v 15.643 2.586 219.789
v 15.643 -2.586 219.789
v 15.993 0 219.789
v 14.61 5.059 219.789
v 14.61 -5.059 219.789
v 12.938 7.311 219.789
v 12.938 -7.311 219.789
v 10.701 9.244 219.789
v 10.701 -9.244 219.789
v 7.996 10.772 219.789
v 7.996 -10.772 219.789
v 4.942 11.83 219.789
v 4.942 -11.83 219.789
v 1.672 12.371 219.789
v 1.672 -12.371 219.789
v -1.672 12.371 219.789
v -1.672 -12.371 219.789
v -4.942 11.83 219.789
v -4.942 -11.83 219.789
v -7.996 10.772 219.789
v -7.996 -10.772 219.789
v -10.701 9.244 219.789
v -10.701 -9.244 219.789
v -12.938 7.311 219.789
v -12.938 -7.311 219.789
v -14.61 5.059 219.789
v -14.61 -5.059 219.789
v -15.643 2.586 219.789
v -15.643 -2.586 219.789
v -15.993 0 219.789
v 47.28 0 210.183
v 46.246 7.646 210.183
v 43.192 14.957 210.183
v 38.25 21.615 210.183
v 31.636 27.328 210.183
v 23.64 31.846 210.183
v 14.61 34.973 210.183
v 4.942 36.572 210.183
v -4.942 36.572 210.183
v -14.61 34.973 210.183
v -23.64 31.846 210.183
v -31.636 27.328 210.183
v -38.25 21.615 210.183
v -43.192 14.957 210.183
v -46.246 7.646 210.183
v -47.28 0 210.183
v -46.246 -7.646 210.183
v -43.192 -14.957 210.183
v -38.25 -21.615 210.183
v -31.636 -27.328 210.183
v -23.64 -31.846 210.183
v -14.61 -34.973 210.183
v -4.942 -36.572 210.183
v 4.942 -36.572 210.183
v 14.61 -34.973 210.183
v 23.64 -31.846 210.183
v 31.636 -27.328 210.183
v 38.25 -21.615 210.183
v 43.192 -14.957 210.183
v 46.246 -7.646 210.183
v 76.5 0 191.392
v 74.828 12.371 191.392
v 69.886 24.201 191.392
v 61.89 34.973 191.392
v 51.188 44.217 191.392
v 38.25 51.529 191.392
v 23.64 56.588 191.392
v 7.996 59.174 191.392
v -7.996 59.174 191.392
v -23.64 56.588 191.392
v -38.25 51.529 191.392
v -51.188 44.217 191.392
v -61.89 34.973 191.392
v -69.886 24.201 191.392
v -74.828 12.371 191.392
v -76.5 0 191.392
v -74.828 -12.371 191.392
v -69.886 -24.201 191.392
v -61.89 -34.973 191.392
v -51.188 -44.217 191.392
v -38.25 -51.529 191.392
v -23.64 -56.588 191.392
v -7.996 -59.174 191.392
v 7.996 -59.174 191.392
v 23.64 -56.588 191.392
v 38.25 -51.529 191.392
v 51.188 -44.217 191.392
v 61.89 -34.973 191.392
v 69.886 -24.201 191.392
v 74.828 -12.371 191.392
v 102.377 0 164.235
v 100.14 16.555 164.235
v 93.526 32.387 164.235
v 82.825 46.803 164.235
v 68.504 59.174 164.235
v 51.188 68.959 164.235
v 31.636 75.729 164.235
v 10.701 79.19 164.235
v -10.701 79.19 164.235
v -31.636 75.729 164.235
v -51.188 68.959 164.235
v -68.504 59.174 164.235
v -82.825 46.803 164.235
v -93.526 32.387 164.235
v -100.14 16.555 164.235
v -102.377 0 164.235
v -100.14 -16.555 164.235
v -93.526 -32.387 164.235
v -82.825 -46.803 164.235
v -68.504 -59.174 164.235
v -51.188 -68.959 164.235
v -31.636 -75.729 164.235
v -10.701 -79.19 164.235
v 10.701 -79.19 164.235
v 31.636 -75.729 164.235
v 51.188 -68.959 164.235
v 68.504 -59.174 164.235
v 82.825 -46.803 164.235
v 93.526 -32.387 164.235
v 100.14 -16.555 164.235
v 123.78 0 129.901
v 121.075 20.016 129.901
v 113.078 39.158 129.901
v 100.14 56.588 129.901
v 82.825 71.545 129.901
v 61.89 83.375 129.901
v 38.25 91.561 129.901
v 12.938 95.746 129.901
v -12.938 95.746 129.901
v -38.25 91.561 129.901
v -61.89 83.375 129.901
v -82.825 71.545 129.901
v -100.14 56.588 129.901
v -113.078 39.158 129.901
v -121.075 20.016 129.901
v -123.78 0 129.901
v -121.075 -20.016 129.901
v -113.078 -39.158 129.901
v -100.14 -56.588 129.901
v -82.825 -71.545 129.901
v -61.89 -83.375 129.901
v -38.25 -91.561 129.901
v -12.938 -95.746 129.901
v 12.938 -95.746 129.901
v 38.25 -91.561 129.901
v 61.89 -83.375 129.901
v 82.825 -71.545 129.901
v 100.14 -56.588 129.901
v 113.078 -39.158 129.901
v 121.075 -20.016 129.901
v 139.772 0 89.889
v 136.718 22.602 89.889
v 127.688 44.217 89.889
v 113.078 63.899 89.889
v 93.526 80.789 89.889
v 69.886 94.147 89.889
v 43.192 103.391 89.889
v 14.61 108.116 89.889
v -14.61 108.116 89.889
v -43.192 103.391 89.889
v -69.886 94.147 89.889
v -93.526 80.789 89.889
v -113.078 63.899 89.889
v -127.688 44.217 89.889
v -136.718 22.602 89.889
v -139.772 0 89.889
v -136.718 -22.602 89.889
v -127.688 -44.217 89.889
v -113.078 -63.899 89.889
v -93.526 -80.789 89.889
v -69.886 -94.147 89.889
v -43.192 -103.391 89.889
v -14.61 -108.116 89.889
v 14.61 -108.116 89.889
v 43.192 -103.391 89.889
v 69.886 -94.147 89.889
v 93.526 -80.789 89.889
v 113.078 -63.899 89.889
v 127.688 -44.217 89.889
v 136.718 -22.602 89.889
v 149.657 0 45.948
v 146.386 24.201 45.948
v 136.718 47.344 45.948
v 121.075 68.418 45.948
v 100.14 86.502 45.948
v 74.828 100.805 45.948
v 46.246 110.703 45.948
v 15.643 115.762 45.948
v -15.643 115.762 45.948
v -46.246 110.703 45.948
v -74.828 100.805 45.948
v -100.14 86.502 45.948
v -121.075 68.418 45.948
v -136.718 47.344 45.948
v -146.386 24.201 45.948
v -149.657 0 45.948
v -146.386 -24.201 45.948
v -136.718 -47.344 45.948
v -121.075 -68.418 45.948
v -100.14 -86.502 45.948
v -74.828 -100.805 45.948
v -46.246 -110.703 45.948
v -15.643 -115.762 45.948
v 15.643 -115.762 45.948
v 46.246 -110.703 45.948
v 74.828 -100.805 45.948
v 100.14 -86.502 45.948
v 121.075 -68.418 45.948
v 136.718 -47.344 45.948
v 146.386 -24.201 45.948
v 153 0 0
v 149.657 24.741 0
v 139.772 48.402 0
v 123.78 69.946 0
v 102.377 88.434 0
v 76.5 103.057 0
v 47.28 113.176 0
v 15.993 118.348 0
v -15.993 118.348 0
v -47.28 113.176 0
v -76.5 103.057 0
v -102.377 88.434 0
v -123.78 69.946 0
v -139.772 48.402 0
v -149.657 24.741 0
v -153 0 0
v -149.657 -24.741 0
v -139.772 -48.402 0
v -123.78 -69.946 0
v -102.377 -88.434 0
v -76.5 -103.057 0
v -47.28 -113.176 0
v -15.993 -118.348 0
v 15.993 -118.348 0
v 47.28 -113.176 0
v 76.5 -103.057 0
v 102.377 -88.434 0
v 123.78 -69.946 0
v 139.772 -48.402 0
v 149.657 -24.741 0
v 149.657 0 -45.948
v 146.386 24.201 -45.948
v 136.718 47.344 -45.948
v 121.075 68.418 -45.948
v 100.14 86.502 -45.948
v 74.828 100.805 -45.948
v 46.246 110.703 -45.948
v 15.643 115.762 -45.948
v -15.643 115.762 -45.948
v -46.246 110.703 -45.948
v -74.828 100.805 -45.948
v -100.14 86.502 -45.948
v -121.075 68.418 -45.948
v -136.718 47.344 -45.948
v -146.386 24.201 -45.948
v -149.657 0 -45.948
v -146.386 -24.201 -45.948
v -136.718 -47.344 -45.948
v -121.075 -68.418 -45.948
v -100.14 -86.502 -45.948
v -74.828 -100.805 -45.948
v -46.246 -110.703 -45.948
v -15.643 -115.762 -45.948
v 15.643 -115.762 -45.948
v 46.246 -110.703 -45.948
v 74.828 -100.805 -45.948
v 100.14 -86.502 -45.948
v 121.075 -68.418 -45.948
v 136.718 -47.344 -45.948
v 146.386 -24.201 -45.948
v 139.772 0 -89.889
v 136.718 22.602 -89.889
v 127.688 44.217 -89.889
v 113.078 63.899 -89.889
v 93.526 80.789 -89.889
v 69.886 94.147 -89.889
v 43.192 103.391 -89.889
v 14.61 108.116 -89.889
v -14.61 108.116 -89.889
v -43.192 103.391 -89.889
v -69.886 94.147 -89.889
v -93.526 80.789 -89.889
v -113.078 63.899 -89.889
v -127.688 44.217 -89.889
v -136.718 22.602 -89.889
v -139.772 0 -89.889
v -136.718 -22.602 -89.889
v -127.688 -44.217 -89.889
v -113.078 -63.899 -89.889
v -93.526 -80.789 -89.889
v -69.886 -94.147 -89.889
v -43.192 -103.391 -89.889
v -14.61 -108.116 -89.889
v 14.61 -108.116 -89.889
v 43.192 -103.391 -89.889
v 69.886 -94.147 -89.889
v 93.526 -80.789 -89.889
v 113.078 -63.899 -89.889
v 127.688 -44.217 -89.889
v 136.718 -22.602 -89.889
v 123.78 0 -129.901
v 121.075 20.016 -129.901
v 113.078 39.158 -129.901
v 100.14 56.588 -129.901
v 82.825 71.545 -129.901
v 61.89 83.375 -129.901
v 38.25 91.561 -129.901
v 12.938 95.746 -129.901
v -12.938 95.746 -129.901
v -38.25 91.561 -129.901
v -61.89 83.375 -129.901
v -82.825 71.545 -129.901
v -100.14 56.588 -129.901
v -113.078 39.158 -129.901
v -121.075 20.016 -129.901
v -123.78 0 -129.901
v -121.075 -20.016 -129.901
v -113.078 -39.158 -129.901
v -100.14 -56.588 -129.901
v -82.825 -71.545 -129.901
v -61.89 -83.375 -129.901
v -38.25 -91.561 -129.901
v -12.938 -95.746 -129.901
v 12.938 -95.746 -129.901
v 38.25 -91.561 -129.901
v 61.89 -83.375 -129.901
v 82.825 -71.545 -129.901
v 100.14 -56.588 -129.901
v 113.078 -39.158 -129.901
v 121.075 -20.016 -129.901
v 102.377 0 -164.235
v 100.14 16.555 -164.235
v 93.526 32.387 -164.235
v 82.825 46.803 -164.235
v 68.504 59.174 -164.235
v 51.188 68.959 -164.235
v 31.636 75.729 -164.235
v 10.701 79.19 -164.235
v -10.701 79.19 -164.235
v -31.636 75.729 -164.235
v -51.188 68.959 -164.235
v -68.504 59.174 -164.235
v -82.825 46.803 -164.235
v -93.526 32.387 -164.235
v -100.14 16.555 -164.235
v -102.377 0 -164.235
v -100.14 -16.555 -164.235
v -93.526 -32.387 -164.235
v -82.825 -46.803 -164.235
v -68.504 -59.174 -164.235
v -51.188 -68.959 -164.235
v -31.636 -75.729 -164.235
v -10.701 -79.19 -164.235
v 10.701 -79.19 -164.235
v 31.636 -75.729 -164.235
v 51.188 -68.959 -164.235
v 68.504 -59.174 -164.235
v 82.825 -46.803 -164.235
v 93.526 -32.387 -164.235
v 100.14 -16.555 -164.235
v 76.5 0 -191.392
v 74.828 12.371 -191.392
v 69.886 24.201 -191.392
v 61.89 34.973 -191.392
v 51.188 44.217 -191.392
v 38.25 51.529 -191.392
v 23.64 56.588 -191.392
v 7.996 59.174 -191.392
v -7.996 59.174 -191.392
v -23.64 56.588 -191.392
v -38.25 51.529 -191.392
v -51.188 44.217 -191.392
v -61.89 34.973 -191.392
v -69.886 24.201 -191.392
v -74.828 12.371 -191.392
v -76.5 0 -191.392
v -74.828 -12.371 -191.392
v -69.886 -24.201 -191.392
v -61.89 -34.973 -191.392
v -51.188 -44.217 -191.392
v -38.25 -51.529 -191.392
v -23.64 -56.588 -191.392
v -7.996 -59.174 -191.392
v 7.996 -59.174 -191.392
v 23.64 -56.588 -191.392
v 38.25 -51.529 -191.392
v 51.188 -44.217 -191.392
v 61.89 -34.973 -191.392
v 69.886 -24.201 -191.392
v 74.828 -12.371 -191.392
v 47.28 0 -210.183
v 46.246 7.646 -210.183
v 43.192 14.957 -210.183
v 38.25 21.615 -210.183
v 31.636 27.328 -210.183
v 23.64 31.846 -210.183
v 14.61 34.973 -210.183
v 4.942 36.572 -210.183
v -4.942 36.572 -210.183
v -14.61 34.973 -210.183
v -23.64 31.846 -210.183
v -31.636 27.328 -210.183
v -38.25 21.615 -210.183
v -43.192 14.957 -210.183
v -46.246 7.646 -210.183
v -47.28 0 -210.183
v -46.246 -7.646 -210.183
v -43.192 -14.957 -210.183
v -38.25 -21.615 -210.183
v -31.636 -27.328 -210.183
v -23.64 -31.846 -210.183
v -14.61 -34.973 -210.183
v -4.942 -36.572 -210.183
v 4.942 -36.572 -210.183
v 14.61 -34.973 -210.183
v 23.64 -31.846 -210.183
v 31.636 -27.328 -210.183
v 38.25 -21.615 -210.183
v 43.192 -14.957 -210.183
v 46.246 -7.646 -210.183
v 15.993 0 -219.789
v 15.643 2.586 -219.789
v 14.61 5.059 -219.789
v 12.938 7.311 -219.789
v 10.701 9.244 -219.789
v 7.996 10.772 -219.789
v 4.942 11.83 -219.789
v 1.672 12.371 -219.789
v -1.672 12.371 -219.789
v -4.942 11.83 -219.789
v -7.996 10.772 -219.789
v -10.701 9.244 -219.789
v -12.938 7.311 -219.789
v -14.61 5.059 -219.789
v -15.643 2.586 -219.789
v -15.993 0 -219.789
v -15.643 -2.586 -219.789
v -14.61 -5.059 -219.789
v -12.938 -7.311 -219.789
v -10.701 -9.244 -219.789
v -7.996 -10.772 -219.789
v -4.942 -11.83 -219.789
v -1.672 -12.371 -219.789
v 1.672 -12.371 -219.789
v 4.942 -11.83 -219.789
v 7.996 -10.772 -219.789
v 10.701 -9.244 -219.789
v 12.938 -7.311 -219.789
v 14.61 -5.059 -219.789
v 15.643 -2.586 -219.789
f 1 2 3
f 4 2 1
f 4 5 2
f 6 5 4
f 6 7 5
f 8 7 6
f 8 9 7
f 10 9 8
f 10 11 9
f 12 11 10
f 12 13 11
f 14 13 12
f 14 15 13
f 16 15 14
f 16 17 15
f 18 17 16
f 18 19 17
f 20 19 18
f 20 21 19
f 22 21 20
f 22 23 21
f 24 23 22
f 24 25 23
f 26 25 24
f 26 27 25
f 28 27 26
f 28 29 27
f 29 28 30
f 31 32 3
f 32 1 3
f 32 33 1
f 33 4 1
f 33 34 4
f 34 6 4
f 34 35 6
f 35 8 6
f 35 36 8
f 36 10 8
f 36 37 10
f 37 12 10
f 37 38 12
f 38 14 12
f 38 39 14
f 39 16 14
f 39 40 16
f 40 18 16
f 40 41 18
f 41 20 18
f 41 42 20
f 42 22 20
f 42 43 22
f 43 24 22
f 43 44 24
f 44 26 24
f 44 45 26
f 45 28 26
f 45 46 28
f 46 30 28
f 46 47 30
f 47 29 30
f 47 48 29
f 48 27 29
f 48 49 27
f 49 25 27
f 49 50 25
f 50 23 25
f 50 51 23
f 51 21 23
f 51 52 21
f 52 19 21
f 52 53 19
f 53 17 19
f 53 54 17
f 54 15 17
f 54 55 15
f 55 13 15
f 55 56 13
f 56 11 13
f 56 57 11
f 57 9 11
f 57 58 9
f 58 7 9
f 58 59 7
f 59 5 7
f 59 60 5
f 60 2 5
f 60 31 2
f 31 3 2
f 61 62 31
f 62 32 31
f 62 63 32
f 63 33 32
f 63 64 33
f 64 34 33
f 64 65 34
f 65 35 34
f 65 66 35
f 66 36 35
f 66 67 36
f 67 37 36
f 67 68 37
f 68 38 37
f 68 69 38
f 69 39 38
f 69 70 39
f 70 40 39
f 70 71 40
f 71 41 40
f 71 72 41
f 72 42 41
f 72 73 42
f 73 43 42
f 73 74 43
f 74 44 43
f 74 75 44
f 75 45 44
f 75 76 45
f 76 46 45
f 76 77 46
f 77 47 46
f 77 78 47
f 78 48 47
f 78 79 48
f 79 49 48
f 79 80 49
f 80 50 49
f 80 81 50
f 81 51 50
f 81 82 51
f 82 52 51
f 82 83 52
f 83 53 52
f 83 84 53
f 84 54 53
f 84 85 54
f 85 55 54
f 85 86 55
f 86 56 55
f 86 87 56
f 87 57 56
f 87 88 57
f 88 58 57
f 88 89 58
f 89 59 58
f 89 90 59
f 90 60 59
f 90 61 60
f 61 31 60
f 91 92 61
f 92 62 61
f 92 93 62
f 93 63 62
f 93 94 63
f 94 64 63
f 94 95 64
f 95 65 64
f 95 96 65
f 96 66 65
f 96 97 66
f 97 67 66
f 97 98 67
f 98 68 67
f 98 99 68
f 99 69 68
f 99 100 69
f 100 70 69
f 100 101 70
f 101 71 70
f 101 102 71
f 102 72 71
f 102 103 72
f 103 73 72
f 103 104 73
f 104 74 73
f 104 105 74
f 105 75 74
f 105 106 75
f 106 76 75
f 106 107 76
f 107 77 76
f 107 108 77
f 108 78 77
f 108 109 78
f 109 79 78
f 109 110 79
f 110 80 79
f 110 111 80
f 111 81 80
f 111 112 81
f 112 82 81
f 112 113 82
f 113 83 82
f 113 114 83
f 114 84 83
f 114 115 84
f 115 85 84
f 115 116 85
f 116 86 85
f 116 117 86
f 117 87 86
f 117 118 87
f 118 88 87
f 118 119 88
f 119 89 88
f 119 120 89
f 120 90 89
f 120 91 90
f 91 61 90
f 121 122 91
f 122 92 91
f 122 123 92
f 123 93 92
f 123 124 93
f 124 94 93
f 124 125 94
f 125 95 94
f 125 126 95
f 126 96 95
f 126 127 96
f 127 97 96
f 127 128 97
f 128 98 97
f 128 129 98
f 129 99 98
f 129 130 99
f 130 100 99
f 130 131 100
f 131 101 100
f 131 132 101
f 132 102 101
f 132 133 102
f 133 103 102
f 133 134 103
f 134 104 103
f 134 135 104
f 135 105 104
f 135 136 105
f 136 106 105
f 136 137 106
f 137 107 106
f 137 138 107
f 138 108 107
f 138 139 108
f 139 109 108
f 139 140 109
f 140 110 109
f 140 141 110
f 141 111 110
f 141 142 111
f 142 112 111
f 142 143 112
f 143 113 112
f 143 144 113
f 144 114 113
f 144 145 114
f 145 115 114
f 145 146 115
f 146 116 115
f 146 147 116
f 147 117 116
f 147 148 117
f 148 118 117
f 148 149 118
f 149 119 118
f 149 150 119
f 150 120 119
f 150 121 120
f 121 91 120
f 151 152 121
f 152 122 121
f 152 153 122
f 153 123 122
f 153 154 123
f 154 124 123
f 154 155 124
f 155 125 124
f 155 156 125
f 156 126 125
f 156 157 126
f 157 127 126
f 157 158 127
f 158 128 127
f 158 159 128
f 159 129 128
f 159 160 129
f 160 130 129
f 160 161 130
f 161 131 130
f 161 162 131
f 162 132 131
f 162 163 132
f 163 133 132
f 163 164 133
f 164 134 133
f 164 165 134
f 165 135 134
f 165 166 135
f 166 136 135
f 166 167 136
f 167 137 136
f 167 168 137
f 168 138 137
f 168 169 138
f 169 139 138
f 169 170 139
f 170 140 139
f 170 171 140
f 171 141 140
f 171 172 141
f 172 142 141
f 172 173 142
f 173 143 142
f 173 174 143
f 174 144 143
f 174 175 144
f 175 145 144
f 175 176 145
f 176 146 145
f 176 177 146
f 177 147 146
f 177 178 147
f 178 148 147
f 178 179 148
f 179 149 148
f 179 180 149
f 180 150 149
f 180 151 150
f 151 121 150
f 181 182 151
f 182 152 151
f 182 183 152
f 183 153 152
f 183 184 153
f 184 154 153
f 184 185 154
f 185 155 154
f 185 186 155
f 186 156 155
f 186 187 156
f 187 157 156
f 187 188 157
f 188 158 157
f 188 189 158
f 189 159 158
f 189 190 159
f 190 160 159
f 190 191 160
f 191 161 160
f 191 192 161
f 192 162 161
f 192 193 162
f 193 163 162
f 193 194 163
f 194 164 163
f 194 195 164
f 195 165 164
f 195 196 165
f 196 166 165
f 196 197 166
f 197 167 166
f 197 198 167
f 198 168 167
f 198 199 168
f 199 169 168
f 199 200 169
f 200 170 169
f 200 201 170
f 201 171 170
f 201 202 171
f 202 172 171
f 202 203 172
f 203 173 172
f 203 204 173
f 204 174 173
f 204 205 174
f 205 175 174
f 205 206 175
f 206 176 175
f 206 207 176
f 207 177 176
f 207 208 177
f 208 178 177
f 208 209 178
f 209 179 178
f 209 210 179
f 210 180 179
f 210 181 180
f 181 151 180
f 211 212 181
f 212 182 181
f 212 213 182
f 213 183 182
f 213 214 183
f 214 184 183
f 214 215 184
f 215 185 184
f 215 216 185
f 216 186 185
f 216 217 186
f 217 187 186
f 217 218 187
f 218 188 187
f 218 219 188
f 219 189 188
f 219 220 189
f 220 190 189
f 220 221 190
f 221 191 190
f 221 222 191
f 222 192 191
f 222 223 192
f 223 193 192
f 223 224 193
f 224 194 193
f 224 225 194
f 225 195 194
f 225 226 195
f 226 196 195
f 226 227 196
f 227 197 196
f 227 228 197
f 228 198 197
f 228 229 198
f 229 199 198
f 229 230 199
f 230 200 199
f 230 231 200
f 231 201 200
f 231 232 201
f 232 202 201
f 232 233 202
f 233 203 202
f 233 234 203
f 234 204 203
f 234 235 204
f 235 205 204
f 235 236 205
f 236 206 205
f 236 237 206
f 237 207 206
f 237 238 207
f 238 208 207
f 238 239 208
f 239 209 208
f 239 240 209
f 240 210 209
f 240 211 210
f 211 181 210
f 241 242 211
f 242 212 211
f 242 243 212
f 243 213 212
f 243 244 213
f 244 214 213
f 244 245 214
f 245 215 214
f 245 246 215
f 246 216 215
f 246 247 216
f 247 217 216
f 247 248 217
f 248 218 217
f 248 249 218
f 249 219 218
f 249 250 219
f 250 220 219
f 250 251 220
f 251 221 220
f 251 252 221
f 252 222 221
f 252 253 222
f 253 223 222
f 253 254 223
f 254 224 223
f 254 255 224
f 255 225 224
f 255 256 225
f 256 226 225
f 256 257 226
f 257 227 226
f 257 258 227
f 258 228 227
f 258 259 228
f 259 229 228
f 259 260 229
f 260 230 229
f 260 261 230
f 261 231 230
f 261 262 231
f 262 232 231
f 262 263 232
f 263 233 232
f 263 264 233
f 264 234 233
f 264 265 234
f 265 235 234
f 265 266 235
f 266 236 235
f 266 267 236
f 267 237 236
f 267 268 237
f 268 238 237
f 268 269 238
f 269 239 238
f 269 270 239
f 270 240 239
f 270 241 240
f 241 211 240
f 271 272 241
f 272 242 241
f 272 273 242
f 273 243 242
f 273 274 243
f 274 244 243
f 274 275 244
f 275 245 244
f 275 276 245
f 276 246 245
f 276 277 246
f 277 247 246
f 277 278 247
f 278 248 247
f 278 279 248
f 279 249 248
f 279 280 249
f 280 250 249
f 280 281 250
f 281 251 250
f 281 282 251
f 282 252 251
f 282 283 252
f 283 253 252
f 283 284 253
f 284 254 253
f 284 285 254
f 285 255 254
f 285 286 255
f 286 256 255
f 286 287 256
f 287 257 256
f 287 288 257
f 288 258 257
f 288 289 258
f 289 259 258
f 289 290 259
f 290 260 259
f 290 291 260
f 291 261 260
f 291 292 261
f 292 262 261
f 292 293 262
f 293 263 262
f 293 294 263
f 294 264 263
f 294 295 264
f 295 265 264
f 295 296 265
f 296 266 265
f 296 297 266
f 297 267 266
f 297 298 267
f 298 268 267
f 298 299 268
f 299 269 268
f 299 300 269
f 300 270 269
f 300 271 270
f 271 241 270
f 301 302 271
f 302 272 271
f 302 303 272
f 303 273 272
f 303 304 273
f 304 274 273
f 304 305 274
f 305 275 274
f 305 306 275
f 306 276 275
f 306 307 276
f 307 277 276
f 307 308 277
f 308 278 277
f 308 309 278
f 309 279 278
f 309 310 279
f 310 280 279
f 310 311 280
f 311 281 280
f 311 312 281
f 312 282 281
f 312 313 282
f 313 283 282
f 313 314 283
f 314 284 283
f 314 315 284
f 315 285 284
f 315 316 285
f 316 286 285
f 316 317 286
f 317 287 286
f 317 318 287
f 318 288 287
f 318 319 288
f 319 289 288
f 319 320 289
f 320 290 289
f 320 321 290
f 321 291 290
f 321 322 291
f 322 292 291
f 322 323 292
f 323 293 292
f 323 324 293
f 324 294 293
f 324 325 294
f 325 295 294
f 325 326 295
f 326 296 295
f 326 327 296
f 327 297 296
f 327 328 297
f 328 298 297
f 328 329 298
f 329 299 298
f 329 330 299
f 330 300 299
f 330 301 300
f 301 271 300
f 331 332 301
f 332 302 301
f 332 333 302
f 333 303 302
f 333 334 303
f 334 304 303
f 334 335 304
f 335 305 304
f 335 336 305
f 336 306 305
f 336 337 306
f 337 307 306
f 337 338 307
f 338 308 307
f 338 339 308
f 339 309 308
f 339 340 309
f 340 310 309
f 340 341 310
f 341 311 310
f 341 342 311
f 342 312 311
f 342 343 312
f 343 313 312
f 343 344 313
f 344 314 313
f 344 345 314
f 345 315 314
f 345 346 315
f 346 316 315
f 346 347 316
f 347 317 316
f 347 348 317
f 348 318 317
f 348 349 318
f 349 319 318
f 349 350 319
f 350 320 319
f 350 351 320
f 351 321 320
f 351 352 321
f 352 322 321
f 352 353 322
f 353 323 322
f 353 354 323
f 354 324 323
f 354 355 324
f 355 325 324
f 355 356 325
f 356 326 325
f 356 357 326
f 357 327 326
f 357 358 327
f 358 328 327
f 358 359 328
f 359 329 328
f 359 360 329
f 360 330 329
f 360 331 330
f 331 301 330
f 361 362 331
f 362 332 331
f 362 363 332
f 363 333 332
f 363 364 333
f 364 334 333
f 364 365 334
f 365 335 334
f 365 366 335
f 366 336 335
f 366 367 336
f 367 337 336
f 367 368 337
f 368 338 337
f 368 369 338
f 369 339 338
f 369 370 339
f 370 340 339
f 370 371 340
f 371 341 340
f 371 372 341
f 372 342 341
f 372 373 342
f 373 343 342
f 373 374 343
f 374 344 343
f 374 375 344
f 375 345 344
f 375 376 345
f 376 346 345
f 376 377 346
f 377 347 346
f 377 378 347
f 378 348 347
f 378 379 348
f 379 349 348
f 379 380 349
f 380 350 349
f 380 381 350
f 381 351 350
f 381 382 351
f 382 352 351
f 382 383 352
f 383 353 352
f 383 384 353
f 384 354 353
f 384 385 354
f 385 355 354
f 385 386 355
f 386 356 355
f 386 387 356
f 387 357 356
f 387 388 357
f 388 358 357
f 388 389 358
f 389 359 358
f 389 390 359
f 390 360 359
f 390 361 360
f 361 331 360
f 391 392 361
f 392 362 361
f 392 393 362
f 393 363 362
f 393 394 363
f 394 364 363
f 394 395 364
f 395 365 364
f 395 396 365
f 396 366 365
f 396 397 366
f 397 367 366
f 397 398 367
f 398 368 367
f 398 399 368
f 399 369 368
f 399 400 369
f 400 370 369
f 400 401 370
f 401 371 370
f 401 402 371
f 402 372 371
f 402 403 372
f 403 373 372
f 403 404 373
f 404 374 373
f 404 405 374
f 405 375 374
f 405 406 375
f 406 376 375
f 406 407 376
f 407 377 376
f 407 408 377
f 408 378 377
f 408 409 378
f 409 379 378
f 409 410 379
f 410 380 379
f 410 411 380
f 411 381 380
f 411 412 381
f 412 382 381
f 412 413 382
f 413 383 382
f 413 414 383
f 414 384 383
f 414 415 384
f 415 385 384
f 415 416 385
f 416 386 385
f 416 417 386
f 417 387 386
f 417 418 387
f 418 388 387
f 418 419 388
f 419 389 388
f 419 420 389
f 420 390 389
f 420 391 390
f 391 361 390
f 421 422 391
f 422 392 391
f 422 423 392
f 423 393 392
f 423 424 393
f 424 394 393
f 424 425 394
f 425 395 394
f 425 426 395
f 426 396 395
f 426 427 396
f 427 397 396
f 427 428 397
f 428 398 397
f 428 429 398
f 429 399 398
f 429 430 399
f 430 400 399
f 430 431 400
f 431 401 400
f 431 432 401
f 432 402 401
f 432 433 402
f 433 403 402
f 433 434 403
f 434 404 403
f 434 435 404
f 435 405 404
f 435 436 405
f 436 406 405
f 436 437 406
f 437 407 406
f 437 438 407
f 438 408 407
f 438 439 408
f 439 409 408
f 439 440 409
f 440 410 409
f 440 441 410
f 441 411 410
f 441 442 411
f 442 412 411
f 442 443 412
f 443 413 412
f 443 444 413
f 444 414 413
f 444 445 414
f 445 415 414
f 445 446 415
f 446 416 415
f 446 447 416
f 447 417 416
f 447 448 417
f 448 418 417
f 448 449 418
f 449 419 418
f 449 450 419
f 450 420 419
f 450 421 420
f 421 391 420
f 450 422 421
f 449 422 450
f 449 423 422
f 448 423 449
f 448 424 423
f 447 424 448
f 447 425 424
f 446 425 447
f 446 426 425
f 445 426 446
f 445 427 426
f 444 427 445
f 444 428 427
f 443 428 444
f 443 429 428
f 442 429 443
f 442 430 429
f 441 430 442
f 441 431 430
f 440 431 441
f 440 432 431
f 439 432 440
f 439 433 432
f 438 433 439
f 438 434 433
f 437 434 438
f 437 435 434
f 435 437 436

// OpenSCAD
// Generated by SolidPython 1.0.1 on 2020-07-29 00:46:48


scale(v = [9, 7, 13]) {
	sphere(r = 17);
}
/***********************************************
*********      SolidPython code:      **********
************************************************
 
# import packages: SolidPython
from solid import *
from solid.utils import *
from itertools import chain, combinations, permutations


class Resize:

    def __init__(self, scad_file):
        self.scad_file = scad_file
        #self.scad_file = import_scad(scad_file)
        # cone/cylinder param:
        self.r1 = 0
        self.r2 = 0
        self.h = 0
        # rectangular prism param:
        self.w = 0
        self.l = 0
        # ellipse param:
        self.r = 0

    # import OpenScad code (file name corresponds to shape)


    # classify shape + parameters
    def assign(self, param1, param2, param3):
        if self.scad_file == 'cone.scad':
            self.r1 = param1
            self.r2 = param2
            self.h = param3
        elif self.scad_file == 'cylinder.scad':
            self.r1 = param1
            self.r2 = param2
            self.h = param3
        elif self.scad_file == 'rectangularPrism.scad':
            self.h = param1
            self.l = param2
            self.w = param3
        else:
            self.r = param1
            self.h = param2

    # resize parameters
    def iterate(self):
        x = range(3, 20, 2)
        i = 1
        if self.scad_file == 'cone.scad':
            tempList = list(permutations(x, 2))
            for temp in tempList:
                param1 = temp[0]
                param2 = temp[1]
                filepath = 'produced_scad_files/' + 'cone' + str(param1) + '_' + str(param2) + '_' + '.scad'
                scad_render_to_file(cylinder(h=param1, r1=param2, r2=0), filepath)

        elif self.scad_file == 'cylinder.scad':
            tempList = list(permutations(x, 3))
            for temp in tempList:
                param1 = temp[0]
                param2 = temp[1]
                filepath = 'produced_scad_files/' + 'cylinder' + str(param1) + '_' + str(param2) + '_' + '.scad'
                scad_render_to_file(cylinder(h=param1, r1=param2, r2=param2), filepath)

        elif self.scad_file == 'rectangularPrism.scad':
            tempList = list(permutations(x, 3))
            for temp in tempList:
                param1 = temp[0]
                param2 = temp[1]
                param3 = temp[2]
                filepath = 'produced_scad_files/' + 'rectangularPrism' + str(param1) + '_' + str(param2) + '_' + str(
                    param3) + '.scad'
                scad_render_to_file(cube(size=(param1, param2, param3)), filepath)

        elif self.scad_file == 'ellipse.scad':
            tempList = list(permutations(x, 4))
            for temp in tempList:
                param1 = temp[0]
                param2 = temp[1]
                param3 = temp[2]
                param4 = temp[3]
                filepath = 'produced_scad_files/' + 'ellipse' + str(param1) + '_' + str(param2) + '_' + str(param3) + '_' + str(param4) + '.scad'
                scad_render_to_file(scale([param1, param2, param3])(sphere(r=param4)), filepath)

    def render_to_scadfile(self):
        scad_render_to_file(scad, 'example.scad') 
 
************************************************/
